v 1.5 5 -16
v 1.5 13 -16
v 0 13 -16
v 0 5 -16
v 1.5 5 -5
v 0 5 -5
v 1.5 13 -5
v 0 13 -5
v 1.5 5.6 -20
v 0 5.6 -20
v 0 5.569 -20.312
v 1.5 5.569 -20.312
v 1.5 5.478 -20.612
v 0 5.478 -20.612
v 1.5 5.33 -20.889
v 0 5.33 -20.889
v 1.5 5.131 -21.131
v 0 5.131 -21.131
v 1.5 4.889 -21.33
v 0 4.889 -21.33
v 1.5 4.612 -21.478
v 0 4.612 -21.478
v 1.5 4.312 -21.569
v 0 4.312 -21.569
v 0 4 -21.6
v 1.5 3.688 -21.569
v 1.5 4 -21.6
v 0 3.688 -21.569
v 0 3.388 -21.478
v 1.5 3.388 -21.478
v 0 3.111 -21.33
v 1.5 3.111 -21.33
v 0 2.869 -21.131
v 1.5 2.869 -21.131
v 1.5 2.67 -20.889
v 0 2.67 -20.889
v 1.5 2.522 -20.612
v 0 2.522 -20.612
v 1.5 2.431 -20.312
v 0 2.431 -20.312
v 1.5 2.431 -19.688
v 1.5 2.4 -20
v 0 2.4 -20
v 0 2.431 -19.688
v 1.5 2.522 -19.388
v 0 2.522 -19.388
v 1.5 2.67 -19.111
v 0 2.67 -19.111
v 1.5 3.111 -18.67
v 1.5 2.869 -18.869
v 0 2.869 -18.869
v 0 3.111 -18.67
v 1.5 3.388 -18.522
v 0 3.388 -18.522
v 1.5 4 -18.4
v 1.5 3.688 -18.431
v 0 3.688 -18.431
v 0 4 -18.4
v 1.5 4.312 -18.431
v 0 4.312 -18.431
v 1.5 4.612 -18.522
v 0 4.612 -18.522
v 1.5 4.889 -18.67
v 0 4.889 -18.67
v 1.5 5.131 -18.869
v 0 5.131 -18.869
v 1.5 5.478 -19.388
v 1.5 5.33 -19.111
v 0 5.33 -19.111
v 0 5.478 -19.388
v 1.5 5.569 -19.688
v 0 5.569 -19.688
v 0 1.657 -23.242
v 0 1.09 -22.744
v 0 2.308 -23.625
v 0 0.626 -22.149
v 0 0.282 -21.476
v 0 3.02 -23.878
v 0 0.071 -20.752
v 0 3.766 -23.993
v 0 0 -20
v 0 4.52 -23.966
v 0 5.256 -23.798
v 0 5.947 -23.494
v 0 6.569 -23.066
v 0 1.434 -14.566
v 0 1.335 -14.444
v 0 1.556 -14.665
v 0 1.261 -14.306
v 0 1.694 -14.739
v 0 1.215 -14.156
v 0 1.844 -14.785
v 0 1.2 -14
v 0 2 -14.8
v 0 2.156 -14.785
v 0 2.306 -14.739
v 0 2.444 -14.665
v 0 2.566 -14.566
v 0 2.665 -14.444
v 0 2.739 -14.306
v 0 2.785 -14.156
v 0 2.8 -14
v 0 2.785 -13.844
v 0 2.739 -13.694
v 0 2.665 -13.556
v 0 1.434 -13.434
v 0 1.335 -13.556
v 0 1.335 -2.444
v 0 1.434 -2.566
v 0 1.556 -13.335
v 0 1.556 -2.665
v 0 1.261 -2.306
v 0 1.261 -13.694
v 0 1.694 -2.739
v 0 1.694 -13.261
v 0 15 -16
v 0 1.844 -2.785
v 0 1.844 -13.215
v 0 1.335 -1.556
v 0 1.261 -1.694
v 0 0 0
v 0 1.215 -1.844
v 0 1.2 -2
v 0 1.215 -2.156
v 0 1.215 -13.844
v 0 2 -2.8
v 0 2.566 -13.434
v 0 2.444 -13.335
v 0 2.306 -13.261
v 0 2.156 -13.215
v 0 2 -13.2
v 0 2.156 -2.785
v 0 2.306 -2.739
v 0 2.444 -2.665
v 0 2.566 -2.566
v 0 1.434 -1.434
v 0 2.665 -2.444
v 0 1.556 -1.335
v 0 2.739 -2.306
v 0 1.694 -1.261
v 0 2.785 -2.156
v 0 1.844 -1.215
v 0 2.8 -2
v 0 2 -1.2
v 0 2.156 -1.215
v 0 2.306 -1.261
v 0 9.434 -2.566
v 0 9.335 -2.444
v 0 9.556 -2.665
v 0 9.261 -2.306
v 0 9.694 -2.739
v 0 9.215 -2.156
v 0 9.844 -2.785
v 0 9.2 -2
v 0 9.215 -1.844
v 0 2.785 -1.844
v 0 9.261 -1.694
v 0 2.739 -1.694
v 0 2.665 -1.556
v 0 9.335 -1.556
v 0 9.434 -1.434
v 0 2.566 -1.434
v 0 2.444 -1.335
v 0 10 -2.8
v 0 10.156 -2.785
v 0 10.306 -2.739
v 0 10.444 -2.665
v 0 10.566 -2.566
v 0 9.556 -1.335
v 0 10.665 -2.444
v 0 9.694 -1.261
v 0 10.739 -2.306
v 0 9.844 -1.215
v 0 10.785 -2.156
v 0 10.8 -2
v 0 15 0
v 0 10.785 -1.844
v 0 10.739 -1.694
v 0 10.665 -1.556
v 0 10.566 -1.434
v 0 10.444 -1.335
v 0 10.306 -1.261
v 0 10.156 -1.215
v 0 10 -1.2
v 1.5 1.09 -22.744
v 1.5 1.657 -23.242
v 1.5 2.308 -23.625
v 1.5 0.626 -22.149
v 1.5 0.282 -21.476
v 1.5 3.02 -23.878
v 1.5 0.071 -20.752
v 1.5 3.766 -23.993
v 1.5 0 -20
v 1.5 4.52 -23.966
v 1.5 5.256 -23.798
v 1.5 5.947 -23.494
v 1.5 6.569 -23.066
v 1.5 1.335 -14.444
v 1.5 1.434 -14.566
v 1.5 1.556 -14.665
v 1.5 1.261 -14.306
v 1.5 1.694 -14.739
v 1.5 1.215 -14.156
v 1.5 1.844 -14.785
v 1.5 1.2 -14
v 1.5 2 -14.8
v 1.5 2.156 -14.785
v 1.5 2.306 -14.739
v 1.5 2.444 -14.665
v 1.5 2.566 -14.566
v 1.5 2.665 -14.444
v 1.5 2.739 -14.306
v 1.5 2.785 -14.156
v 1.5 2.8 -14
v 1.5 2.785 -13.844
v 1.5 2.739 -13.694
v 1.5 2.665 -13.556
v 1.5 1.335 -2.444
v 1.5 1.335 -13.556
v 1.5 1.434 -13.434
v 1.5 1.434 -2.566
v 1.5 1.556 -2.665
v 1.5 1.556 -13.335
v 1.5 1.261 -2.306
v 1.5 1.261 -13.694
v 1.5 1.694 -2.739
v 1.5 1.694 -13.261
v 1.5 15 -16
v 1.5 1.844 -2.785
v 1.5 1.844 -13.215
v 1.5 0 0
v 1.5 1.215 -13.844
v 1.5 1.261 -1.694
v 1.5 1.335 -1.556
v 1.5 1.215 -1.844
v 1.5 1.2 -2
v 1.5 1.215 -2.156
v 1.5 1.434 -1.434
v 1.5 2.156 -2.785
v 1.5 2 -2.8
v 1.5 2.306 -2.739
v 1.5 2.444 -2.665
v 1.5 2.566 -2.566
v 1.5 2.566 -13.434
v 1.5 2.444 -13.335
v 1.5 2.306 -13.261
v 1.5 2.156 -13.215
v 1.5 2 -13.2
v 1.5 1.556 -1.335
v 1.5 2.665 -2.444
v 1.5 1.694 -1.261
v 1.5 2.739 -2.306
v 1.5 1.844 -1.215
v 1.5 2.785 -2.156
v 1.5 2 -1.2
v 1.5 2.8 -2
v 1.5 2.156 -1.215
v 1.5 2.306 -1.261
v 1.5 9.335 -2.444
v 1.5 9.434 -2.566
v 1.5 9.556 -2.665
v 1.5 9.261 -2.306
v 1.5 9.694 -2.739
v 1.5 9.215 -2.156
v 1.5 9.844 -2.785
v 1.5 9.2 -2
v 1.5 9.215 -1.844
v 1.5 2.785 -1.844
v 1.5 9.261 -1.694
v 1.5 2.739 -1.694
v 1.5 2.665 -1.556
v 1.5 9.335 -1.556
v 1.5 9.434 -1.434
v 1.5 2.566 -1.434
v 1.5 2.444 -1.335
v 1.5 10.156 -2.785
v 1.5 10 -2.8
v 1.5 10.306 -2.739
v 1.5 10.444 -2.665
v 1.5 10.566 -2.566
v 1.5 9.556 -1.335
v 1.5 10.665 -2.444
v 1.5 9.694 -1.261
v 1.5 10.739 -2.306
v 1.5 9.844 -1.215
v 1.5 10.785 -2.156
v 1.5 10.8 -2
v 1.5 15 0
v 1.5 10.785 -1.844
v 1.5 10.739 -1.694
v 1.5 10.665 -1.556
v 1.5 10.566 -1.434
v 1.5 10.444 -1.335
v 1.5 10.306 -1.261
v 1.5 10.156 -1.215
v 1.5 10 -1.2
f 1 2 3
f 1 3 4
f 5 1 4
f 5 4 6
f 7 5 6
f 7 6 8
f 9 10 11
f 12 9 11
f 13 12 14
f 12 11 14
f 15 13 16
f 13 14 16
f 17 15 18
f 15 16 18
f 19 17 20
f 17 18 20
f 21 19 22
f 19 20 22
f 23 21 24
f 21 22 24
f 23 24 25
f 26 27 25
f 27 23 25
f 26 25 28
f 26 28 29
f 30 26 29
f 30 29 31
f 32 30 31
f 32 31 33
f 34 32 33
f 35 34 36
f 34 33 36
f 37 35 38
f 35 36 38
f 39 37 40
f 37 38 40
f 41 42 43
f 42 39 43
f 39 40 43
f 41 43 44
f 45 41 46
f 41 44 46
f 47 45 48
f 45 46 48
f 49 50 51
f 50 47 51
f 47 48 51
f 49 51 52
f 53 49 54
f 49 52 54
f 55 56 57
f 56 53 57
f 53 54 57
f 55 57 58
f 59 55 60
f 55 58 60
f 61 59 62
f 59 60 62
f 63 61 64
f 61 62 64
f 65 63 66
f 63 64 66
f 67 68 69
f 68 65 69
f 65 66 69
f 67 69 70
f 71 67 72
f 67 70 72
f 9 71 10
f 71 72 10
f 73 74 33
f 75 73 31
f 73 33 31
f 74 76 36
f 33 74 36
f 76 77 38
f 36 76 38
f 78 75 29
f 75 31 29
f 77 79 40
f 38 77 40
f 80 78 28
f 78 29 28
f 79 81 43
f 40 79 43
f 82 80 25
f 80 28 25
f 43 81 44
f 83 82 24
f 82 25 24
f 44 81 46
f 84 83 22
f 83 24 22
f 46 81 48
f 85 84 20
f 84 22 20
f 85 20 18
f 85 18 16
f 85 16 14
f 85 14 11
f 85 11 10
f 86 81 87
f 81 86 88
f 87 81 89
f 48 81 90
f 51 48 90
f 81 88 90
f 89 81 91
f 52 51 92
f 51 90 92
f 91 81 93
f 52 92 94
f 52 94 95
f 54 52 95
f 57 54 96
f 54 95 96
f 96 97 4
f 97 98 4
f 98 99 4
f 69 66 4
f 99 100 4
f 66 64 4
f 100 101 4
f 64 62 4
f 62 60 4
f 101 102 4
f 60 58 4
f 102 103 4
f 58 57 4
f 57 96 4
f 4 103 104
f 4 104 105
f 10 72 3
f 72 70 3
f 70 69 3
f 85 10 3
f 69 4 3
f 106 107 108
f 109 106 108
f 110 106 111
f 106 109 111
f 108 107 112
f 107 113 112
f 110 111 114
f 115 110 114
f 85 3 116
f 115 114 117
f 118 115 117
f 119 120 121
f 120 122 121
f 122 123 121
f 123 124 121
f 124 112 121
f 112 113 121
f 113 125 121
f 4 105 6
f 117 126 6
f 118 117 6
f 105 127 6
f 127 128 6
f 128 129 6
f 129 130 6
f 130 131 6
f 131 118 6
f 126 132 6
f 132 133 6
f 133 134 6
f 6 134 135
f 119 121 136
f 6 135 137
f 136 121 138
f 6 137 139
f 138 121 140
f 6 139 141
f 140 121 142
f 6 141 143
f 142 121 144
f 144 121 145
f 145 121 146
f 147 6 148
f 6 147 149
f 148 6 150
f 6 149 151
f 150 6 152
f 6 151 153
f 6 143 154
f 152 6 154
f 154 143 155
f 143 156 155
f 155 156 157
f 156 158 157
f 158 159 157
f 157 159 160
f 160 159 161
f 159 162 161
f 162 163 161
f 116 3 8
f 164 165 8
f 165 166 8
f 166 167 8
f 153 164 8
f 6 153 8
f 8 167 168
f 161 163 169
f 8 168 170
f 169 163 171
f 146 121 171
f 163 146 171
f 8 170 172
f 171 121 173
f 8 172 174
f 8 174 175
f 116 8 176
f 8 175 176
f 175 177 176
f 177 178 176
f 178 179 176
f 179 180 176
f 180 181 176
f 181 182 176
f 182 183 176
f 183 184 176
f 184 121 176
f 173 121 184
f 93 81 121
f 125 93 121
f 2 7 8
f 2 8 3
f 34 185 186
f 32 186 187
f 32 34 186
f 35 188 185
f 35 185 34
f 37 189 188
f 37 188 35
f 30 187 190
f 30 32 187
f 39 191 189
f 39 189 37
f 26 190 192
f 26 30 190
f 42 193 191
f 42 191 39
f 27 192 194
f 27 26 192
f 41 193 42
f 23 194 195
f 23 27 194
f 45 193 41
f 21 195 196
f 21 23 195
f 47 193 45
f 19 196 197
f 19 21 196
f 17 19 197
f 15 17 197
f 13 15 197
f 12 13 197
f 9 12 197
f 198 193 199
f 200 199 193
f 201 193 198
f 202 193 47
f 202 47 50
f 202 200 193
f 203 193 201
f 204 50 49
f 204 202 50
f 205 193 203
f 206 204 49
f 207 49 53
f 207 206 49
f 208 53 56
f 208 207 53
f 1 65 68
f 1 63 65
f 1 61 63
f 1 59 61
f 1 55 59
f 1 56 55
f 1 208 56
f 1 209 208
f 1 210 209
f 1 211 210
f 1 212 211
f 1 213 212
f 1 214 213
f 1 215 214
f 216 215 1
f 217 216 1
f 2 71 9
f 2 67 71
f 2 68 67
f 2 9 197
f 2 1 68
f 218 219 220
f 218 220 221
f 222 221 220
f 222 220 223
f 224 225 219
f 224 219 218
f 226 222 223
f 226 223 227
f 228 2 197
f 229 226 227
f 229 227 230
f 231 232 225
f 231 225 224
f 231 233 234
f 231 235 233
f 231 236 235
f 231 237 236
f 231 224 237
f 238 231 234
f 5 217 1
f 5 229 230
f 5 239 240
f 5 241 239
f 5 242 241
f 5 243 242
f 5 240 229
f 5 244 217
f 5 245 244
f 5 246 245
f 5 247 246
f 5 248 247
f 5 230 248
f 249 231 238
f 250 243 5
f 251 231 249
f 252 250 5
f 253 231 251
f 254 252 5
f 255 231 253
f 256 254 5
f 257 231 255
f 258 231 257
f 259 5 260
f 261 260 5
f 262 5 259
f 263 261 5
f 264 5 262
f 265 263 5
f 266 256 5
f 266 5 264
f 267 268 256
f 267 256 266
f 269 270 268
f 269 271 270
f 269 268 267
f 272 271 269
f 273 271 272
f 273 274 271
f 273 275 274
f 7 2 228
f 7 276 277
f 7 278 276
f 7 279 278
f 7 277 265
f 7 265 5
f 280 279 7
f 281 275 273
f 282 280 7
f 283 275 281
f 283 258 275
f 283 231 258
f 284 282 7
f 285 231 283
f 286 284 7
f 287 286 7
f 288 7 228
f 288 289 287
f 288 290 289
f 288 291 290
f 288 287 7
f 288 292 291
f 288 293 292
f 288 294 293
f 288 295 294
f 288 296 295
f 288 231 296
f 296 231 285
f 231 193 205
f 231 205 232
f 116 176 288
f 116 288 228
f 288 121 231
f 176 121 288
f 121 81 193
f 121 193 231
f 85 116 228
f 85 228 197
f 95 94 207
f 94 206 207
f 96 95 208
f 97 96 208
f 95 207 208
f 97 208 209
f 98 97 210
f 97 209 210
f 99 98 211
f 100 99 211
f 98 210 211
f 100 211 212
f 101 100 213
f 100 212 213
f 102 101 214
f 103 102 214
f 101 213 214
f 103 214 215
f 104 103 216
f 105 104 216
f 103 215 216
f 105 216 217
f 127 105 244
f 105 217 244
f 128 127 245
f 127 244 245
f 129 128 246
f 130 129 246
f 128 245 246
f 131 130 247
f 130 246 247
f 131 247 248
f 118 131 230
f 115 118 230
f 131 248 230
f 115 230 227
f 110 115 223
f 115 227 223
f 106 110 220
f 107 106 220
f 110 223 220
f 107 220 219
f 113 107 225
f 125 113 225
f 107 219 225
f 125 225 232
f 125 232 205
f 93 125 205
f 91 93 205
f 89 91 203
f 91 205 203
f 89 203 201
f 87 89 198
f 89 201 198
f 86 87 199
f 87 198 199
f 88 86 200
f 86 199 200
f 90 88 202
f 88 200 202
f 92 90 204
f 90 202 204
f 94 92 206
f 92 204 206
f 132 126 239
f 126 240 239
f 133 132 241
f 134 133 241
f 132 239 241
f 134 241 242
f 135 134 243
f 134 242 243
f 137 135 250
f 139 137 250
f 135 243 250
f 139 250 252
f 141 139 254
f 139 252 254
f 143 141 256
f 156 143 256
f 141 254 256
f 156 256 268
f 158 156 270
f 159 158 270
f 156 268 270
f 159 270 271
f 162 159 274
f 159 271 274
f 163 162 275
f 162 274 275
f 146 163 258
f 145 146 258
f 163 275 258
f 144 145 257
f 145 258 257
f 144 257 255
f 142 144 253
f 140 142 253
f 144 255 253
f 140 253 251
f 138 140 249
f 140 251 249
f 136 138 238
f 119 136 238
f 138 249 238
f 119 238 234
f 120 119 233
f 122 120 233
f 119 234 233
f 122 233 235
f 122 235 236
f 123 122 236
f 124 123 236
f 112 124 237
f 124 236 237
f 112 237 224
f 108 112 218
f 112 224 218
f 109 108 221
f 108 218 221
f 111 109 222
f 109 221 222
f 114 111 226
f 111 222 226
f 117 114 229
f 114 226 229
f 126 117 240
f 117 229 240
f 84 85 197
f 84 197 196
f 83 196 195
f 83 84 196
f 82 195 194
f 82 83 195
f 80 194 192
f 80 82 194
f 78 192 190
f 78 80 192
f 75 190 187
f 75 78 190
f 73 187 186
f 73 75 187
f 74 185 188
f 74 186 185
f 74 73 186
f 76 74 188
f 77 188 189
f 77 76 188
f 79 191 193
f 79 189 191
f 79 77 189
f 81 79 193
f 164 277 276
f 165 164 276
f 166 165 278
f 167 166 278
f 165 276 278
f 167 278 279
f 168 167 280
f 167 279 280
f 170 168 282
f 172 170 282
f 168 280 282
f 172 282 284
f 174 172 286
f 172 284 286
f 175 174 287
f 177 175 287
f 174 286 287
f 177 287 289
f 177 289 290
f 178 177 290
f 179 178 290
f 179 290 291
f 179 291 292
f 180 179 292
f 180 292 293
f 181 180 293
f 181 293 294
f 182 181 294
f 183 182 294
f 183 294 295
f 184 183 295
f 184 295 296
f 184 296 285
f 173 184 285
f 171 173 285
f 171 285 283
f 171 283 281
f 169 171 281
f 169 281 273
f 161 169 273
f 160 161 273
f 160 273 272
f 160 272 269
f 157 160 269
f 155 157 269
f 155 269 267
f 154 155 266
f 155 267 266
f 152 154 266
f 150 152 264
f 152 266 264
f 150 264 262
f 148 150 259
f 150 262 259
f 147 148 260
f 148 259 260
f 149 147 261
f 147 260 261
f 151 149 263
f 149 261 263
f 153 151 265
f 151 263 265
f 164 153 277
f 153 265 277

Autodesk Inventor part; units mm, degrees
ref_plane "YZ Plane" through (0, 0, 0) normal (1, 0, 0) x (0, 1, 0)
ref_plane "XZ Plane" through (0, 0, 0) normal (0, 1, 0) x (-1, 0, 0)
ref_plane "XY Plane" through (0, 0, 0) normal (0, 0, 1) x (1, 0, 0)
sketch "スケッチ1" plane through (0, 0, 0) normal (1, 0, 0) x (0, 1, 0)
  line L0 (0, 0) -> (15, 0)
  line L1 (15, 0) -> (15, -16)
  line L2 (15, -16) -> (0, -16)
  line L3 (0, -16) -> (0, 0)
  circle A0 centre (4, -20) radius 4
  circle A1 centre (4, -20) radius 1.6
  line L4 (15, -16) -> (6.5693, -23.0657)
  line L5 (0, -20) -> (0, -16)
  dimension "d0" = 15
  dimension "d2" = 3.2
  dimension "d3" = 8
  dimension "d5" = 20
extrude "プレート1" add sketch "スケッチ1" along normal blind 1.5
sketch "スケッチ2" plane through (1.5, 0, 0) normal (1, 0, 0) x (0, 0, -1)
  circle A0 centre (2, 10) radius 0.8 projected
  circle A1 centre (2, 2) radius 0.8 projected
  circle A2 centre (20, 4) radius 1.6 projected
  line L0 (0, 15) -> (16, 15) projected
  line L1 (0, 0) -> (0, 15) projected
  line L2 (20, 0) -> (0, 0) projected
  arc A3 (20, 0) -> (23.0657, 6.5693) centre (20, 4) ccw projected
  line L3 (16, 15) -> (23.0657, 6.5693) projected
  circle A4 centre (14, 2) radius 0.8 projected
  line L4 (5, 13) -> (16, 13)
  line L5 (16, 13) -> (16, 5)
  line L6 (16, 5) -> (5, 5)
  line L7 (5, 5) -> (5, 13)
  dimension "d8" = 2
  dimension "d9" = 3
  dimension "d10" = 3
extrude "切り取り1" cut sketch "スケッチ2" against normal blind 1.5 contours A0 | A1 | A4 | L4 L5 L6 L7
equation "\"d6\" = Thickness"
equation "\"d4\" = Thickness"
equation "\"BendRadius\" = Thickness"
equation "\"BendReliefWidth\" = Thickness"
equation "\"BendReliefDepth\" = 0.5 * Thickness"
equation "\"CornerReliefSize\" = 4 * Thickness"
equation "\"MinimumRemnant\" = 2 * Thickness"
equation "\"TransitionRadius\" = BendRadius"
equation "\"JacobiRadiusSize\" = BendRadius"
equation "\"GapSize\" = Thickness"
equation "\"Thickness\" = 1.5"
properties part number "battery_cover_setter_joint"
